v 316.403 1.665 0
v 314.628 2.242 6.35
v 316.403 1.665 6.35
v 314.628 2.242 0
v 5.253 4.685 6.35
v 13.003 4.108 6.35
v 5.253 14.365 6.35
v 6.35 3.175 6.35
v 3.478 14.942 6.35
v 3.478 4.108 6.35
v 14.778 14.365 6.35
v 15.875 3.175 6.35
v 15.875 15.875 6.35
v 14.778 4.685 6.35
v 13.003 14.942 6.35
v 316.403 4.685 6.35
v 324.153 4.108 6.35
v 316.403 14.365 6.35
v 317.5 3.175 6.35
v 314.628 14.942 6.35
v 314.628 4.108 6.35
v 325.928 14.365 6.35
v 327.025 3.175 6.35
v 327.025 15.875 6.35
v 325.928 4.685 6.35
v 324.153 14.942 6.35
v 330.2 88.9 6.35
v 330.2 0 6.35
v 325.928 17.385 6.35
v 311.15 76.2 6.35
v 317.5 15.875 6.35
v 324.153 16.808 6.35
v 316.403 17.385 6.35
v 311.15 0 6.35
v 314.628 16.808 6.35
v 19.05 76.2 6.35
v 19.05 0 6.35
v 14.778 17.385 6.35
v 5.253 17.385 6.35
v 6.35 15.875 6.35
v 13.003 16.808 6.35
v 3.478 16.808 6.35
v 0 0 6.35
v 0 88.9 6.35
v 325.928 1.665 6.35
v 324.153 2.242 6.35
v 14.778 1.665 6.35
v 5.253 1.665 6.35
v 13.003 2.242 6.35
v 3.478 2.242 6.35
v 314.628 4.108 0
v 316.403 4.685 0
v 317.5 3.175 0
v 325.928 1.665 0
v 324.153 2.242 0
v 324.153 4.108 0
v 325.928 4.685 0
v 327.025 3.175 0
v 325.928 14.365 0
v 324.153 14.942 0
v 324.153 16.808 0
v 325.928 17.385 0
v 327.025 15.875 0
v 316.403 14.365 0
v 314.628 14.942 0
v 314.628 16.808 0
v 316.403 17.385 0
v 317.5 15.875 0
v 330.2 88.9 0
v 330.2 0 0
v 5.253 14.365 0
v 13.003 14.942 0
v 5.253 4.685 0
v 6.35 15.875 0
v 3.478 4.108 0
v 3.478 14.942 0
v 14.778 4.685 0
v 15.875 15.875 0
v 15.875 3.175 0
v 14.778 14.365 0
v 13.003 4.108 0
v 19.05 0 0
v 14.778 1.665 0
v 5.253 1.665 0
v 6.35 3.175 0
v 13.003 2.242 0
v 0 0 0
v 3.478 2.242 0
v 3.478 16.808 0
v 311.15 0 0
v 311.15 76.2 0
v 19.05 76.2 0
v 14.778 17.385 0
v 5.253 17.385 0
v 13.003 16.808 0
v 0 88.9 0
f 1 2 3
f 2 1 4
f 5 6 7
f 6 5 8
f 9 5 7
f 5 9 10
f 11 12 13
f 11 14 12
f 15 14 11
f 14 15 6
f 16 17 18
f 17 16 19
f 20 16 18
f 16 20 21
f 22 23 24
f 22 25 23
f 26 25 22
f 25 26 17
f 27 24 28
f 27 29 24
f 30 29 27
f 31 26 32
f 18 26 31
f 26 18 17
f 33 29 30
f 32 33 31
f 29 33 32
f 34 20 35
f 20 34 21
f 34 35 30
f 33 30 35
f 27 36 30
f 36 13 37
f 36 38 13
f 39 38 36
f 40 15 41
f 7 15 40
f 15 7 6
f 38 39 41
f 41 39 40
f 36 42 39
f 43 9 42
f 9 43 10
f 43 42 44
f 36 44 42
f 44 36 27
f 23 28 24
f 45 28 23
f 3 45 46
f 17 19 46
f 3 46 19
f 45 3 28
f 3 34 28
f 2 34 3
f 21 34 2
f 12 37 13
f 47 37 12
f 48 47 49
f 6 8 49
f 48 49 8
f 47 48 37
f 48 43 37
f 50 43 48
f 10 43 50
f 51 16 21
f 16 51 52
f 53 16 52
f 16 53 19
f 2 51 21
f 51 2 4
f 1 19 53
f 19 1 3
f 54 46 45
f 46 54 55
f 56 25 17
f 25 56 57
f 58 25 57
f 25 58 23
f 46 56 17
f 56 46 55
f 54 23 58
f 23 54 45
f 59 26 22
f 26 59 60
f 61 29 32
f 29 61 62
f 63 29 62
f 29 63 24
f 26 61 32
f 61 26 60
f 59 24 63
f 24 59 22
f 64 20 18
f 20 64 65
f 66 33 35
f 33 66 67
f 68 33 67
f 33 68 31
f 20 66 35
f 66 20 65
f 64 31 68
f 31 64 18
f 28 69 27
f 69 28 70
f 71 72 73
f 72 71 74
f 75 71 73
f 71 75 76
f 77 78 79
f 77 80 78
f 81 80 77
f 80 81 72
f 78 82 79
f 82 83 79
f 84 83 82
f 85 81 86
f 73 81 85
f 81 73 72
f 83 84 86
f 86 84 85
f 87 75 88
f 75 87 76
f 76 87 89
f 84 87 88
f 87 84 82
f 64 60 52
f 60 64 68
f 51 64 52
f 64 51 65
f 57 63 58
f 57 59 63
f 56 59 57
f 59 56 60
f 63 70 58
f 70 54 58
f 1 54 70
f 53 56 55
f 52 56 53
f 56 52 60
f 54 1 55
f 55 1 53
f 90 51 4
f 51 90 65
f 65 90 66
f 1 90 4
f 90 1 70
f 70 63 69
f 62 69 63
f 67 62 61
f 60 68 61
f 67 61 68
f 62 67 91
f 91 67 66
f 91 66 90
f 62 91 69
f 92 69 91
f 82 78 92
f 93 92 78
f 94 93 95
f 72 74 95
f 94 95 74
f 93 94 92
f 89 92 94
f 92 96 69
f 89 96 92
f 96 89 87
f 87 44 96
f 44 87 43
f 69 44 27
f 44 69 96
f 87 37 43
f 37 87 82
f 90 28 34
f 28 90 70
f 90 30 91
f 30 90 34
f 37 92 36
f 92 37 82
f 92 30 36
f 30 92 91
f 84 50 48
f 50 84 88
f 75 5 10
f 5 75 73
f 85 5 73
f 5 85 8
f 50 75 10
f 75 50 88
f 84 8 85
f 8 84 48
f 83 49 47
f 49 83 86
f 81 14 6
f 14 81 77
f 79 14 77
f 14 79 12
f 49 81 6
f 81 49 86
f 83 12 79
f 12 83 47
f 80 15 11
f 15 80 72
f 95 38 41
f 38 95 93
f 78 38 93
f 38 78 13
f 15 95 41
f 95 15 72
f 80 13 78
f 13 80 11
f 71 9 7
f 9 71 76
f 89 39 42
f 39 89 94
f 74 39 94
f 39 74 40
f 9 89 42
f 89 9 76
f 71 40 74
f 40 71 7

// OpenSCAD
function mm(i) = i*25.4; 
    rolldiam = mm(8); //diameter of the roll of paper
    tubediam = mm(2); //diameter of the cardboard tube at the center
	 rollheight = mm(11); //height of paper roll
	 thickness= mm(.25); // thickness of material
	 boltwidth = mm(1/8); // desired diameter of bolt holes
	 

module paperdirector(thickness=mm(.25), rolldiam=mm(8), tubediam=mm(2)) 
    { 
			 difference() 
         { 
              	cube([rollheight+mm(2), (rolldiam/2-tubediam/2)+mm(.5), thickness]);
    
              translate([mm(.75), -1, -1]) 
              { 
                 cube([rollheight+mm(.5), (rolldiam/2-tubediam/2)+1,thickness+2]);
    			  }
		 translate([mm(.375)-mm(.375/2), mm(.25/2), -1]) 
             { 
                 cylinder(thickness+2, boltwidth/2, boltwidth/2, 0);
             } 
		 translate([mm(.375)+mm(.375/2), mm(.25/2), -1]) 
             { 
                 cylinder(thickness+2, boltwidth/2, boltwidth/2, 0);
             } 
		 translate([mm(.375)+mm(.375/2), mm(.5+.25/2), -1]) 
             { 
                 cylinder(thickness+2, boltwidth/2, boltwidth/2, 0);
             } 
		 translate([mm(.375)-mm(.375/2), mm(.5+.25/2), -1]) 
             { 
                 cylinder(thickness+2, boltwidth/2, boltwidth/2, 0);
             } 
			translate([rollheight+mm(1.25), 0, -1])
			{
				 translate([mm(.375)-mm(.375/2), mm(.25/2), -1]) 
             	{ 
                 cylinder(thickness+2, boltwidth/2, boltwidth/2, 0);
            	} 
				 translate([mm(.375)+mm(.375/2), mm(.25/2), -1]) 
             	{ 
                 cylinder(thickness+2, boltwidth/2, boltwidth/2, 0);
             	} 
		 		translate([mm(.375)+mm(.375/2), mm(.5+.25/2), -1]) 
             	{ 
                 cylinder(thickness+2, boltwidth/2, boltwidth/2, 0);
             	} 
		 		translate([mm(.375)-mm(.375/2), mm(.5+.25/2), -1]) 
             	{ 
                 cylinder(thickness+2, boltwidth/2, boltwidth/2, 0);
             	} 
		}		
	}
 }   
    


   
paperdirector();
